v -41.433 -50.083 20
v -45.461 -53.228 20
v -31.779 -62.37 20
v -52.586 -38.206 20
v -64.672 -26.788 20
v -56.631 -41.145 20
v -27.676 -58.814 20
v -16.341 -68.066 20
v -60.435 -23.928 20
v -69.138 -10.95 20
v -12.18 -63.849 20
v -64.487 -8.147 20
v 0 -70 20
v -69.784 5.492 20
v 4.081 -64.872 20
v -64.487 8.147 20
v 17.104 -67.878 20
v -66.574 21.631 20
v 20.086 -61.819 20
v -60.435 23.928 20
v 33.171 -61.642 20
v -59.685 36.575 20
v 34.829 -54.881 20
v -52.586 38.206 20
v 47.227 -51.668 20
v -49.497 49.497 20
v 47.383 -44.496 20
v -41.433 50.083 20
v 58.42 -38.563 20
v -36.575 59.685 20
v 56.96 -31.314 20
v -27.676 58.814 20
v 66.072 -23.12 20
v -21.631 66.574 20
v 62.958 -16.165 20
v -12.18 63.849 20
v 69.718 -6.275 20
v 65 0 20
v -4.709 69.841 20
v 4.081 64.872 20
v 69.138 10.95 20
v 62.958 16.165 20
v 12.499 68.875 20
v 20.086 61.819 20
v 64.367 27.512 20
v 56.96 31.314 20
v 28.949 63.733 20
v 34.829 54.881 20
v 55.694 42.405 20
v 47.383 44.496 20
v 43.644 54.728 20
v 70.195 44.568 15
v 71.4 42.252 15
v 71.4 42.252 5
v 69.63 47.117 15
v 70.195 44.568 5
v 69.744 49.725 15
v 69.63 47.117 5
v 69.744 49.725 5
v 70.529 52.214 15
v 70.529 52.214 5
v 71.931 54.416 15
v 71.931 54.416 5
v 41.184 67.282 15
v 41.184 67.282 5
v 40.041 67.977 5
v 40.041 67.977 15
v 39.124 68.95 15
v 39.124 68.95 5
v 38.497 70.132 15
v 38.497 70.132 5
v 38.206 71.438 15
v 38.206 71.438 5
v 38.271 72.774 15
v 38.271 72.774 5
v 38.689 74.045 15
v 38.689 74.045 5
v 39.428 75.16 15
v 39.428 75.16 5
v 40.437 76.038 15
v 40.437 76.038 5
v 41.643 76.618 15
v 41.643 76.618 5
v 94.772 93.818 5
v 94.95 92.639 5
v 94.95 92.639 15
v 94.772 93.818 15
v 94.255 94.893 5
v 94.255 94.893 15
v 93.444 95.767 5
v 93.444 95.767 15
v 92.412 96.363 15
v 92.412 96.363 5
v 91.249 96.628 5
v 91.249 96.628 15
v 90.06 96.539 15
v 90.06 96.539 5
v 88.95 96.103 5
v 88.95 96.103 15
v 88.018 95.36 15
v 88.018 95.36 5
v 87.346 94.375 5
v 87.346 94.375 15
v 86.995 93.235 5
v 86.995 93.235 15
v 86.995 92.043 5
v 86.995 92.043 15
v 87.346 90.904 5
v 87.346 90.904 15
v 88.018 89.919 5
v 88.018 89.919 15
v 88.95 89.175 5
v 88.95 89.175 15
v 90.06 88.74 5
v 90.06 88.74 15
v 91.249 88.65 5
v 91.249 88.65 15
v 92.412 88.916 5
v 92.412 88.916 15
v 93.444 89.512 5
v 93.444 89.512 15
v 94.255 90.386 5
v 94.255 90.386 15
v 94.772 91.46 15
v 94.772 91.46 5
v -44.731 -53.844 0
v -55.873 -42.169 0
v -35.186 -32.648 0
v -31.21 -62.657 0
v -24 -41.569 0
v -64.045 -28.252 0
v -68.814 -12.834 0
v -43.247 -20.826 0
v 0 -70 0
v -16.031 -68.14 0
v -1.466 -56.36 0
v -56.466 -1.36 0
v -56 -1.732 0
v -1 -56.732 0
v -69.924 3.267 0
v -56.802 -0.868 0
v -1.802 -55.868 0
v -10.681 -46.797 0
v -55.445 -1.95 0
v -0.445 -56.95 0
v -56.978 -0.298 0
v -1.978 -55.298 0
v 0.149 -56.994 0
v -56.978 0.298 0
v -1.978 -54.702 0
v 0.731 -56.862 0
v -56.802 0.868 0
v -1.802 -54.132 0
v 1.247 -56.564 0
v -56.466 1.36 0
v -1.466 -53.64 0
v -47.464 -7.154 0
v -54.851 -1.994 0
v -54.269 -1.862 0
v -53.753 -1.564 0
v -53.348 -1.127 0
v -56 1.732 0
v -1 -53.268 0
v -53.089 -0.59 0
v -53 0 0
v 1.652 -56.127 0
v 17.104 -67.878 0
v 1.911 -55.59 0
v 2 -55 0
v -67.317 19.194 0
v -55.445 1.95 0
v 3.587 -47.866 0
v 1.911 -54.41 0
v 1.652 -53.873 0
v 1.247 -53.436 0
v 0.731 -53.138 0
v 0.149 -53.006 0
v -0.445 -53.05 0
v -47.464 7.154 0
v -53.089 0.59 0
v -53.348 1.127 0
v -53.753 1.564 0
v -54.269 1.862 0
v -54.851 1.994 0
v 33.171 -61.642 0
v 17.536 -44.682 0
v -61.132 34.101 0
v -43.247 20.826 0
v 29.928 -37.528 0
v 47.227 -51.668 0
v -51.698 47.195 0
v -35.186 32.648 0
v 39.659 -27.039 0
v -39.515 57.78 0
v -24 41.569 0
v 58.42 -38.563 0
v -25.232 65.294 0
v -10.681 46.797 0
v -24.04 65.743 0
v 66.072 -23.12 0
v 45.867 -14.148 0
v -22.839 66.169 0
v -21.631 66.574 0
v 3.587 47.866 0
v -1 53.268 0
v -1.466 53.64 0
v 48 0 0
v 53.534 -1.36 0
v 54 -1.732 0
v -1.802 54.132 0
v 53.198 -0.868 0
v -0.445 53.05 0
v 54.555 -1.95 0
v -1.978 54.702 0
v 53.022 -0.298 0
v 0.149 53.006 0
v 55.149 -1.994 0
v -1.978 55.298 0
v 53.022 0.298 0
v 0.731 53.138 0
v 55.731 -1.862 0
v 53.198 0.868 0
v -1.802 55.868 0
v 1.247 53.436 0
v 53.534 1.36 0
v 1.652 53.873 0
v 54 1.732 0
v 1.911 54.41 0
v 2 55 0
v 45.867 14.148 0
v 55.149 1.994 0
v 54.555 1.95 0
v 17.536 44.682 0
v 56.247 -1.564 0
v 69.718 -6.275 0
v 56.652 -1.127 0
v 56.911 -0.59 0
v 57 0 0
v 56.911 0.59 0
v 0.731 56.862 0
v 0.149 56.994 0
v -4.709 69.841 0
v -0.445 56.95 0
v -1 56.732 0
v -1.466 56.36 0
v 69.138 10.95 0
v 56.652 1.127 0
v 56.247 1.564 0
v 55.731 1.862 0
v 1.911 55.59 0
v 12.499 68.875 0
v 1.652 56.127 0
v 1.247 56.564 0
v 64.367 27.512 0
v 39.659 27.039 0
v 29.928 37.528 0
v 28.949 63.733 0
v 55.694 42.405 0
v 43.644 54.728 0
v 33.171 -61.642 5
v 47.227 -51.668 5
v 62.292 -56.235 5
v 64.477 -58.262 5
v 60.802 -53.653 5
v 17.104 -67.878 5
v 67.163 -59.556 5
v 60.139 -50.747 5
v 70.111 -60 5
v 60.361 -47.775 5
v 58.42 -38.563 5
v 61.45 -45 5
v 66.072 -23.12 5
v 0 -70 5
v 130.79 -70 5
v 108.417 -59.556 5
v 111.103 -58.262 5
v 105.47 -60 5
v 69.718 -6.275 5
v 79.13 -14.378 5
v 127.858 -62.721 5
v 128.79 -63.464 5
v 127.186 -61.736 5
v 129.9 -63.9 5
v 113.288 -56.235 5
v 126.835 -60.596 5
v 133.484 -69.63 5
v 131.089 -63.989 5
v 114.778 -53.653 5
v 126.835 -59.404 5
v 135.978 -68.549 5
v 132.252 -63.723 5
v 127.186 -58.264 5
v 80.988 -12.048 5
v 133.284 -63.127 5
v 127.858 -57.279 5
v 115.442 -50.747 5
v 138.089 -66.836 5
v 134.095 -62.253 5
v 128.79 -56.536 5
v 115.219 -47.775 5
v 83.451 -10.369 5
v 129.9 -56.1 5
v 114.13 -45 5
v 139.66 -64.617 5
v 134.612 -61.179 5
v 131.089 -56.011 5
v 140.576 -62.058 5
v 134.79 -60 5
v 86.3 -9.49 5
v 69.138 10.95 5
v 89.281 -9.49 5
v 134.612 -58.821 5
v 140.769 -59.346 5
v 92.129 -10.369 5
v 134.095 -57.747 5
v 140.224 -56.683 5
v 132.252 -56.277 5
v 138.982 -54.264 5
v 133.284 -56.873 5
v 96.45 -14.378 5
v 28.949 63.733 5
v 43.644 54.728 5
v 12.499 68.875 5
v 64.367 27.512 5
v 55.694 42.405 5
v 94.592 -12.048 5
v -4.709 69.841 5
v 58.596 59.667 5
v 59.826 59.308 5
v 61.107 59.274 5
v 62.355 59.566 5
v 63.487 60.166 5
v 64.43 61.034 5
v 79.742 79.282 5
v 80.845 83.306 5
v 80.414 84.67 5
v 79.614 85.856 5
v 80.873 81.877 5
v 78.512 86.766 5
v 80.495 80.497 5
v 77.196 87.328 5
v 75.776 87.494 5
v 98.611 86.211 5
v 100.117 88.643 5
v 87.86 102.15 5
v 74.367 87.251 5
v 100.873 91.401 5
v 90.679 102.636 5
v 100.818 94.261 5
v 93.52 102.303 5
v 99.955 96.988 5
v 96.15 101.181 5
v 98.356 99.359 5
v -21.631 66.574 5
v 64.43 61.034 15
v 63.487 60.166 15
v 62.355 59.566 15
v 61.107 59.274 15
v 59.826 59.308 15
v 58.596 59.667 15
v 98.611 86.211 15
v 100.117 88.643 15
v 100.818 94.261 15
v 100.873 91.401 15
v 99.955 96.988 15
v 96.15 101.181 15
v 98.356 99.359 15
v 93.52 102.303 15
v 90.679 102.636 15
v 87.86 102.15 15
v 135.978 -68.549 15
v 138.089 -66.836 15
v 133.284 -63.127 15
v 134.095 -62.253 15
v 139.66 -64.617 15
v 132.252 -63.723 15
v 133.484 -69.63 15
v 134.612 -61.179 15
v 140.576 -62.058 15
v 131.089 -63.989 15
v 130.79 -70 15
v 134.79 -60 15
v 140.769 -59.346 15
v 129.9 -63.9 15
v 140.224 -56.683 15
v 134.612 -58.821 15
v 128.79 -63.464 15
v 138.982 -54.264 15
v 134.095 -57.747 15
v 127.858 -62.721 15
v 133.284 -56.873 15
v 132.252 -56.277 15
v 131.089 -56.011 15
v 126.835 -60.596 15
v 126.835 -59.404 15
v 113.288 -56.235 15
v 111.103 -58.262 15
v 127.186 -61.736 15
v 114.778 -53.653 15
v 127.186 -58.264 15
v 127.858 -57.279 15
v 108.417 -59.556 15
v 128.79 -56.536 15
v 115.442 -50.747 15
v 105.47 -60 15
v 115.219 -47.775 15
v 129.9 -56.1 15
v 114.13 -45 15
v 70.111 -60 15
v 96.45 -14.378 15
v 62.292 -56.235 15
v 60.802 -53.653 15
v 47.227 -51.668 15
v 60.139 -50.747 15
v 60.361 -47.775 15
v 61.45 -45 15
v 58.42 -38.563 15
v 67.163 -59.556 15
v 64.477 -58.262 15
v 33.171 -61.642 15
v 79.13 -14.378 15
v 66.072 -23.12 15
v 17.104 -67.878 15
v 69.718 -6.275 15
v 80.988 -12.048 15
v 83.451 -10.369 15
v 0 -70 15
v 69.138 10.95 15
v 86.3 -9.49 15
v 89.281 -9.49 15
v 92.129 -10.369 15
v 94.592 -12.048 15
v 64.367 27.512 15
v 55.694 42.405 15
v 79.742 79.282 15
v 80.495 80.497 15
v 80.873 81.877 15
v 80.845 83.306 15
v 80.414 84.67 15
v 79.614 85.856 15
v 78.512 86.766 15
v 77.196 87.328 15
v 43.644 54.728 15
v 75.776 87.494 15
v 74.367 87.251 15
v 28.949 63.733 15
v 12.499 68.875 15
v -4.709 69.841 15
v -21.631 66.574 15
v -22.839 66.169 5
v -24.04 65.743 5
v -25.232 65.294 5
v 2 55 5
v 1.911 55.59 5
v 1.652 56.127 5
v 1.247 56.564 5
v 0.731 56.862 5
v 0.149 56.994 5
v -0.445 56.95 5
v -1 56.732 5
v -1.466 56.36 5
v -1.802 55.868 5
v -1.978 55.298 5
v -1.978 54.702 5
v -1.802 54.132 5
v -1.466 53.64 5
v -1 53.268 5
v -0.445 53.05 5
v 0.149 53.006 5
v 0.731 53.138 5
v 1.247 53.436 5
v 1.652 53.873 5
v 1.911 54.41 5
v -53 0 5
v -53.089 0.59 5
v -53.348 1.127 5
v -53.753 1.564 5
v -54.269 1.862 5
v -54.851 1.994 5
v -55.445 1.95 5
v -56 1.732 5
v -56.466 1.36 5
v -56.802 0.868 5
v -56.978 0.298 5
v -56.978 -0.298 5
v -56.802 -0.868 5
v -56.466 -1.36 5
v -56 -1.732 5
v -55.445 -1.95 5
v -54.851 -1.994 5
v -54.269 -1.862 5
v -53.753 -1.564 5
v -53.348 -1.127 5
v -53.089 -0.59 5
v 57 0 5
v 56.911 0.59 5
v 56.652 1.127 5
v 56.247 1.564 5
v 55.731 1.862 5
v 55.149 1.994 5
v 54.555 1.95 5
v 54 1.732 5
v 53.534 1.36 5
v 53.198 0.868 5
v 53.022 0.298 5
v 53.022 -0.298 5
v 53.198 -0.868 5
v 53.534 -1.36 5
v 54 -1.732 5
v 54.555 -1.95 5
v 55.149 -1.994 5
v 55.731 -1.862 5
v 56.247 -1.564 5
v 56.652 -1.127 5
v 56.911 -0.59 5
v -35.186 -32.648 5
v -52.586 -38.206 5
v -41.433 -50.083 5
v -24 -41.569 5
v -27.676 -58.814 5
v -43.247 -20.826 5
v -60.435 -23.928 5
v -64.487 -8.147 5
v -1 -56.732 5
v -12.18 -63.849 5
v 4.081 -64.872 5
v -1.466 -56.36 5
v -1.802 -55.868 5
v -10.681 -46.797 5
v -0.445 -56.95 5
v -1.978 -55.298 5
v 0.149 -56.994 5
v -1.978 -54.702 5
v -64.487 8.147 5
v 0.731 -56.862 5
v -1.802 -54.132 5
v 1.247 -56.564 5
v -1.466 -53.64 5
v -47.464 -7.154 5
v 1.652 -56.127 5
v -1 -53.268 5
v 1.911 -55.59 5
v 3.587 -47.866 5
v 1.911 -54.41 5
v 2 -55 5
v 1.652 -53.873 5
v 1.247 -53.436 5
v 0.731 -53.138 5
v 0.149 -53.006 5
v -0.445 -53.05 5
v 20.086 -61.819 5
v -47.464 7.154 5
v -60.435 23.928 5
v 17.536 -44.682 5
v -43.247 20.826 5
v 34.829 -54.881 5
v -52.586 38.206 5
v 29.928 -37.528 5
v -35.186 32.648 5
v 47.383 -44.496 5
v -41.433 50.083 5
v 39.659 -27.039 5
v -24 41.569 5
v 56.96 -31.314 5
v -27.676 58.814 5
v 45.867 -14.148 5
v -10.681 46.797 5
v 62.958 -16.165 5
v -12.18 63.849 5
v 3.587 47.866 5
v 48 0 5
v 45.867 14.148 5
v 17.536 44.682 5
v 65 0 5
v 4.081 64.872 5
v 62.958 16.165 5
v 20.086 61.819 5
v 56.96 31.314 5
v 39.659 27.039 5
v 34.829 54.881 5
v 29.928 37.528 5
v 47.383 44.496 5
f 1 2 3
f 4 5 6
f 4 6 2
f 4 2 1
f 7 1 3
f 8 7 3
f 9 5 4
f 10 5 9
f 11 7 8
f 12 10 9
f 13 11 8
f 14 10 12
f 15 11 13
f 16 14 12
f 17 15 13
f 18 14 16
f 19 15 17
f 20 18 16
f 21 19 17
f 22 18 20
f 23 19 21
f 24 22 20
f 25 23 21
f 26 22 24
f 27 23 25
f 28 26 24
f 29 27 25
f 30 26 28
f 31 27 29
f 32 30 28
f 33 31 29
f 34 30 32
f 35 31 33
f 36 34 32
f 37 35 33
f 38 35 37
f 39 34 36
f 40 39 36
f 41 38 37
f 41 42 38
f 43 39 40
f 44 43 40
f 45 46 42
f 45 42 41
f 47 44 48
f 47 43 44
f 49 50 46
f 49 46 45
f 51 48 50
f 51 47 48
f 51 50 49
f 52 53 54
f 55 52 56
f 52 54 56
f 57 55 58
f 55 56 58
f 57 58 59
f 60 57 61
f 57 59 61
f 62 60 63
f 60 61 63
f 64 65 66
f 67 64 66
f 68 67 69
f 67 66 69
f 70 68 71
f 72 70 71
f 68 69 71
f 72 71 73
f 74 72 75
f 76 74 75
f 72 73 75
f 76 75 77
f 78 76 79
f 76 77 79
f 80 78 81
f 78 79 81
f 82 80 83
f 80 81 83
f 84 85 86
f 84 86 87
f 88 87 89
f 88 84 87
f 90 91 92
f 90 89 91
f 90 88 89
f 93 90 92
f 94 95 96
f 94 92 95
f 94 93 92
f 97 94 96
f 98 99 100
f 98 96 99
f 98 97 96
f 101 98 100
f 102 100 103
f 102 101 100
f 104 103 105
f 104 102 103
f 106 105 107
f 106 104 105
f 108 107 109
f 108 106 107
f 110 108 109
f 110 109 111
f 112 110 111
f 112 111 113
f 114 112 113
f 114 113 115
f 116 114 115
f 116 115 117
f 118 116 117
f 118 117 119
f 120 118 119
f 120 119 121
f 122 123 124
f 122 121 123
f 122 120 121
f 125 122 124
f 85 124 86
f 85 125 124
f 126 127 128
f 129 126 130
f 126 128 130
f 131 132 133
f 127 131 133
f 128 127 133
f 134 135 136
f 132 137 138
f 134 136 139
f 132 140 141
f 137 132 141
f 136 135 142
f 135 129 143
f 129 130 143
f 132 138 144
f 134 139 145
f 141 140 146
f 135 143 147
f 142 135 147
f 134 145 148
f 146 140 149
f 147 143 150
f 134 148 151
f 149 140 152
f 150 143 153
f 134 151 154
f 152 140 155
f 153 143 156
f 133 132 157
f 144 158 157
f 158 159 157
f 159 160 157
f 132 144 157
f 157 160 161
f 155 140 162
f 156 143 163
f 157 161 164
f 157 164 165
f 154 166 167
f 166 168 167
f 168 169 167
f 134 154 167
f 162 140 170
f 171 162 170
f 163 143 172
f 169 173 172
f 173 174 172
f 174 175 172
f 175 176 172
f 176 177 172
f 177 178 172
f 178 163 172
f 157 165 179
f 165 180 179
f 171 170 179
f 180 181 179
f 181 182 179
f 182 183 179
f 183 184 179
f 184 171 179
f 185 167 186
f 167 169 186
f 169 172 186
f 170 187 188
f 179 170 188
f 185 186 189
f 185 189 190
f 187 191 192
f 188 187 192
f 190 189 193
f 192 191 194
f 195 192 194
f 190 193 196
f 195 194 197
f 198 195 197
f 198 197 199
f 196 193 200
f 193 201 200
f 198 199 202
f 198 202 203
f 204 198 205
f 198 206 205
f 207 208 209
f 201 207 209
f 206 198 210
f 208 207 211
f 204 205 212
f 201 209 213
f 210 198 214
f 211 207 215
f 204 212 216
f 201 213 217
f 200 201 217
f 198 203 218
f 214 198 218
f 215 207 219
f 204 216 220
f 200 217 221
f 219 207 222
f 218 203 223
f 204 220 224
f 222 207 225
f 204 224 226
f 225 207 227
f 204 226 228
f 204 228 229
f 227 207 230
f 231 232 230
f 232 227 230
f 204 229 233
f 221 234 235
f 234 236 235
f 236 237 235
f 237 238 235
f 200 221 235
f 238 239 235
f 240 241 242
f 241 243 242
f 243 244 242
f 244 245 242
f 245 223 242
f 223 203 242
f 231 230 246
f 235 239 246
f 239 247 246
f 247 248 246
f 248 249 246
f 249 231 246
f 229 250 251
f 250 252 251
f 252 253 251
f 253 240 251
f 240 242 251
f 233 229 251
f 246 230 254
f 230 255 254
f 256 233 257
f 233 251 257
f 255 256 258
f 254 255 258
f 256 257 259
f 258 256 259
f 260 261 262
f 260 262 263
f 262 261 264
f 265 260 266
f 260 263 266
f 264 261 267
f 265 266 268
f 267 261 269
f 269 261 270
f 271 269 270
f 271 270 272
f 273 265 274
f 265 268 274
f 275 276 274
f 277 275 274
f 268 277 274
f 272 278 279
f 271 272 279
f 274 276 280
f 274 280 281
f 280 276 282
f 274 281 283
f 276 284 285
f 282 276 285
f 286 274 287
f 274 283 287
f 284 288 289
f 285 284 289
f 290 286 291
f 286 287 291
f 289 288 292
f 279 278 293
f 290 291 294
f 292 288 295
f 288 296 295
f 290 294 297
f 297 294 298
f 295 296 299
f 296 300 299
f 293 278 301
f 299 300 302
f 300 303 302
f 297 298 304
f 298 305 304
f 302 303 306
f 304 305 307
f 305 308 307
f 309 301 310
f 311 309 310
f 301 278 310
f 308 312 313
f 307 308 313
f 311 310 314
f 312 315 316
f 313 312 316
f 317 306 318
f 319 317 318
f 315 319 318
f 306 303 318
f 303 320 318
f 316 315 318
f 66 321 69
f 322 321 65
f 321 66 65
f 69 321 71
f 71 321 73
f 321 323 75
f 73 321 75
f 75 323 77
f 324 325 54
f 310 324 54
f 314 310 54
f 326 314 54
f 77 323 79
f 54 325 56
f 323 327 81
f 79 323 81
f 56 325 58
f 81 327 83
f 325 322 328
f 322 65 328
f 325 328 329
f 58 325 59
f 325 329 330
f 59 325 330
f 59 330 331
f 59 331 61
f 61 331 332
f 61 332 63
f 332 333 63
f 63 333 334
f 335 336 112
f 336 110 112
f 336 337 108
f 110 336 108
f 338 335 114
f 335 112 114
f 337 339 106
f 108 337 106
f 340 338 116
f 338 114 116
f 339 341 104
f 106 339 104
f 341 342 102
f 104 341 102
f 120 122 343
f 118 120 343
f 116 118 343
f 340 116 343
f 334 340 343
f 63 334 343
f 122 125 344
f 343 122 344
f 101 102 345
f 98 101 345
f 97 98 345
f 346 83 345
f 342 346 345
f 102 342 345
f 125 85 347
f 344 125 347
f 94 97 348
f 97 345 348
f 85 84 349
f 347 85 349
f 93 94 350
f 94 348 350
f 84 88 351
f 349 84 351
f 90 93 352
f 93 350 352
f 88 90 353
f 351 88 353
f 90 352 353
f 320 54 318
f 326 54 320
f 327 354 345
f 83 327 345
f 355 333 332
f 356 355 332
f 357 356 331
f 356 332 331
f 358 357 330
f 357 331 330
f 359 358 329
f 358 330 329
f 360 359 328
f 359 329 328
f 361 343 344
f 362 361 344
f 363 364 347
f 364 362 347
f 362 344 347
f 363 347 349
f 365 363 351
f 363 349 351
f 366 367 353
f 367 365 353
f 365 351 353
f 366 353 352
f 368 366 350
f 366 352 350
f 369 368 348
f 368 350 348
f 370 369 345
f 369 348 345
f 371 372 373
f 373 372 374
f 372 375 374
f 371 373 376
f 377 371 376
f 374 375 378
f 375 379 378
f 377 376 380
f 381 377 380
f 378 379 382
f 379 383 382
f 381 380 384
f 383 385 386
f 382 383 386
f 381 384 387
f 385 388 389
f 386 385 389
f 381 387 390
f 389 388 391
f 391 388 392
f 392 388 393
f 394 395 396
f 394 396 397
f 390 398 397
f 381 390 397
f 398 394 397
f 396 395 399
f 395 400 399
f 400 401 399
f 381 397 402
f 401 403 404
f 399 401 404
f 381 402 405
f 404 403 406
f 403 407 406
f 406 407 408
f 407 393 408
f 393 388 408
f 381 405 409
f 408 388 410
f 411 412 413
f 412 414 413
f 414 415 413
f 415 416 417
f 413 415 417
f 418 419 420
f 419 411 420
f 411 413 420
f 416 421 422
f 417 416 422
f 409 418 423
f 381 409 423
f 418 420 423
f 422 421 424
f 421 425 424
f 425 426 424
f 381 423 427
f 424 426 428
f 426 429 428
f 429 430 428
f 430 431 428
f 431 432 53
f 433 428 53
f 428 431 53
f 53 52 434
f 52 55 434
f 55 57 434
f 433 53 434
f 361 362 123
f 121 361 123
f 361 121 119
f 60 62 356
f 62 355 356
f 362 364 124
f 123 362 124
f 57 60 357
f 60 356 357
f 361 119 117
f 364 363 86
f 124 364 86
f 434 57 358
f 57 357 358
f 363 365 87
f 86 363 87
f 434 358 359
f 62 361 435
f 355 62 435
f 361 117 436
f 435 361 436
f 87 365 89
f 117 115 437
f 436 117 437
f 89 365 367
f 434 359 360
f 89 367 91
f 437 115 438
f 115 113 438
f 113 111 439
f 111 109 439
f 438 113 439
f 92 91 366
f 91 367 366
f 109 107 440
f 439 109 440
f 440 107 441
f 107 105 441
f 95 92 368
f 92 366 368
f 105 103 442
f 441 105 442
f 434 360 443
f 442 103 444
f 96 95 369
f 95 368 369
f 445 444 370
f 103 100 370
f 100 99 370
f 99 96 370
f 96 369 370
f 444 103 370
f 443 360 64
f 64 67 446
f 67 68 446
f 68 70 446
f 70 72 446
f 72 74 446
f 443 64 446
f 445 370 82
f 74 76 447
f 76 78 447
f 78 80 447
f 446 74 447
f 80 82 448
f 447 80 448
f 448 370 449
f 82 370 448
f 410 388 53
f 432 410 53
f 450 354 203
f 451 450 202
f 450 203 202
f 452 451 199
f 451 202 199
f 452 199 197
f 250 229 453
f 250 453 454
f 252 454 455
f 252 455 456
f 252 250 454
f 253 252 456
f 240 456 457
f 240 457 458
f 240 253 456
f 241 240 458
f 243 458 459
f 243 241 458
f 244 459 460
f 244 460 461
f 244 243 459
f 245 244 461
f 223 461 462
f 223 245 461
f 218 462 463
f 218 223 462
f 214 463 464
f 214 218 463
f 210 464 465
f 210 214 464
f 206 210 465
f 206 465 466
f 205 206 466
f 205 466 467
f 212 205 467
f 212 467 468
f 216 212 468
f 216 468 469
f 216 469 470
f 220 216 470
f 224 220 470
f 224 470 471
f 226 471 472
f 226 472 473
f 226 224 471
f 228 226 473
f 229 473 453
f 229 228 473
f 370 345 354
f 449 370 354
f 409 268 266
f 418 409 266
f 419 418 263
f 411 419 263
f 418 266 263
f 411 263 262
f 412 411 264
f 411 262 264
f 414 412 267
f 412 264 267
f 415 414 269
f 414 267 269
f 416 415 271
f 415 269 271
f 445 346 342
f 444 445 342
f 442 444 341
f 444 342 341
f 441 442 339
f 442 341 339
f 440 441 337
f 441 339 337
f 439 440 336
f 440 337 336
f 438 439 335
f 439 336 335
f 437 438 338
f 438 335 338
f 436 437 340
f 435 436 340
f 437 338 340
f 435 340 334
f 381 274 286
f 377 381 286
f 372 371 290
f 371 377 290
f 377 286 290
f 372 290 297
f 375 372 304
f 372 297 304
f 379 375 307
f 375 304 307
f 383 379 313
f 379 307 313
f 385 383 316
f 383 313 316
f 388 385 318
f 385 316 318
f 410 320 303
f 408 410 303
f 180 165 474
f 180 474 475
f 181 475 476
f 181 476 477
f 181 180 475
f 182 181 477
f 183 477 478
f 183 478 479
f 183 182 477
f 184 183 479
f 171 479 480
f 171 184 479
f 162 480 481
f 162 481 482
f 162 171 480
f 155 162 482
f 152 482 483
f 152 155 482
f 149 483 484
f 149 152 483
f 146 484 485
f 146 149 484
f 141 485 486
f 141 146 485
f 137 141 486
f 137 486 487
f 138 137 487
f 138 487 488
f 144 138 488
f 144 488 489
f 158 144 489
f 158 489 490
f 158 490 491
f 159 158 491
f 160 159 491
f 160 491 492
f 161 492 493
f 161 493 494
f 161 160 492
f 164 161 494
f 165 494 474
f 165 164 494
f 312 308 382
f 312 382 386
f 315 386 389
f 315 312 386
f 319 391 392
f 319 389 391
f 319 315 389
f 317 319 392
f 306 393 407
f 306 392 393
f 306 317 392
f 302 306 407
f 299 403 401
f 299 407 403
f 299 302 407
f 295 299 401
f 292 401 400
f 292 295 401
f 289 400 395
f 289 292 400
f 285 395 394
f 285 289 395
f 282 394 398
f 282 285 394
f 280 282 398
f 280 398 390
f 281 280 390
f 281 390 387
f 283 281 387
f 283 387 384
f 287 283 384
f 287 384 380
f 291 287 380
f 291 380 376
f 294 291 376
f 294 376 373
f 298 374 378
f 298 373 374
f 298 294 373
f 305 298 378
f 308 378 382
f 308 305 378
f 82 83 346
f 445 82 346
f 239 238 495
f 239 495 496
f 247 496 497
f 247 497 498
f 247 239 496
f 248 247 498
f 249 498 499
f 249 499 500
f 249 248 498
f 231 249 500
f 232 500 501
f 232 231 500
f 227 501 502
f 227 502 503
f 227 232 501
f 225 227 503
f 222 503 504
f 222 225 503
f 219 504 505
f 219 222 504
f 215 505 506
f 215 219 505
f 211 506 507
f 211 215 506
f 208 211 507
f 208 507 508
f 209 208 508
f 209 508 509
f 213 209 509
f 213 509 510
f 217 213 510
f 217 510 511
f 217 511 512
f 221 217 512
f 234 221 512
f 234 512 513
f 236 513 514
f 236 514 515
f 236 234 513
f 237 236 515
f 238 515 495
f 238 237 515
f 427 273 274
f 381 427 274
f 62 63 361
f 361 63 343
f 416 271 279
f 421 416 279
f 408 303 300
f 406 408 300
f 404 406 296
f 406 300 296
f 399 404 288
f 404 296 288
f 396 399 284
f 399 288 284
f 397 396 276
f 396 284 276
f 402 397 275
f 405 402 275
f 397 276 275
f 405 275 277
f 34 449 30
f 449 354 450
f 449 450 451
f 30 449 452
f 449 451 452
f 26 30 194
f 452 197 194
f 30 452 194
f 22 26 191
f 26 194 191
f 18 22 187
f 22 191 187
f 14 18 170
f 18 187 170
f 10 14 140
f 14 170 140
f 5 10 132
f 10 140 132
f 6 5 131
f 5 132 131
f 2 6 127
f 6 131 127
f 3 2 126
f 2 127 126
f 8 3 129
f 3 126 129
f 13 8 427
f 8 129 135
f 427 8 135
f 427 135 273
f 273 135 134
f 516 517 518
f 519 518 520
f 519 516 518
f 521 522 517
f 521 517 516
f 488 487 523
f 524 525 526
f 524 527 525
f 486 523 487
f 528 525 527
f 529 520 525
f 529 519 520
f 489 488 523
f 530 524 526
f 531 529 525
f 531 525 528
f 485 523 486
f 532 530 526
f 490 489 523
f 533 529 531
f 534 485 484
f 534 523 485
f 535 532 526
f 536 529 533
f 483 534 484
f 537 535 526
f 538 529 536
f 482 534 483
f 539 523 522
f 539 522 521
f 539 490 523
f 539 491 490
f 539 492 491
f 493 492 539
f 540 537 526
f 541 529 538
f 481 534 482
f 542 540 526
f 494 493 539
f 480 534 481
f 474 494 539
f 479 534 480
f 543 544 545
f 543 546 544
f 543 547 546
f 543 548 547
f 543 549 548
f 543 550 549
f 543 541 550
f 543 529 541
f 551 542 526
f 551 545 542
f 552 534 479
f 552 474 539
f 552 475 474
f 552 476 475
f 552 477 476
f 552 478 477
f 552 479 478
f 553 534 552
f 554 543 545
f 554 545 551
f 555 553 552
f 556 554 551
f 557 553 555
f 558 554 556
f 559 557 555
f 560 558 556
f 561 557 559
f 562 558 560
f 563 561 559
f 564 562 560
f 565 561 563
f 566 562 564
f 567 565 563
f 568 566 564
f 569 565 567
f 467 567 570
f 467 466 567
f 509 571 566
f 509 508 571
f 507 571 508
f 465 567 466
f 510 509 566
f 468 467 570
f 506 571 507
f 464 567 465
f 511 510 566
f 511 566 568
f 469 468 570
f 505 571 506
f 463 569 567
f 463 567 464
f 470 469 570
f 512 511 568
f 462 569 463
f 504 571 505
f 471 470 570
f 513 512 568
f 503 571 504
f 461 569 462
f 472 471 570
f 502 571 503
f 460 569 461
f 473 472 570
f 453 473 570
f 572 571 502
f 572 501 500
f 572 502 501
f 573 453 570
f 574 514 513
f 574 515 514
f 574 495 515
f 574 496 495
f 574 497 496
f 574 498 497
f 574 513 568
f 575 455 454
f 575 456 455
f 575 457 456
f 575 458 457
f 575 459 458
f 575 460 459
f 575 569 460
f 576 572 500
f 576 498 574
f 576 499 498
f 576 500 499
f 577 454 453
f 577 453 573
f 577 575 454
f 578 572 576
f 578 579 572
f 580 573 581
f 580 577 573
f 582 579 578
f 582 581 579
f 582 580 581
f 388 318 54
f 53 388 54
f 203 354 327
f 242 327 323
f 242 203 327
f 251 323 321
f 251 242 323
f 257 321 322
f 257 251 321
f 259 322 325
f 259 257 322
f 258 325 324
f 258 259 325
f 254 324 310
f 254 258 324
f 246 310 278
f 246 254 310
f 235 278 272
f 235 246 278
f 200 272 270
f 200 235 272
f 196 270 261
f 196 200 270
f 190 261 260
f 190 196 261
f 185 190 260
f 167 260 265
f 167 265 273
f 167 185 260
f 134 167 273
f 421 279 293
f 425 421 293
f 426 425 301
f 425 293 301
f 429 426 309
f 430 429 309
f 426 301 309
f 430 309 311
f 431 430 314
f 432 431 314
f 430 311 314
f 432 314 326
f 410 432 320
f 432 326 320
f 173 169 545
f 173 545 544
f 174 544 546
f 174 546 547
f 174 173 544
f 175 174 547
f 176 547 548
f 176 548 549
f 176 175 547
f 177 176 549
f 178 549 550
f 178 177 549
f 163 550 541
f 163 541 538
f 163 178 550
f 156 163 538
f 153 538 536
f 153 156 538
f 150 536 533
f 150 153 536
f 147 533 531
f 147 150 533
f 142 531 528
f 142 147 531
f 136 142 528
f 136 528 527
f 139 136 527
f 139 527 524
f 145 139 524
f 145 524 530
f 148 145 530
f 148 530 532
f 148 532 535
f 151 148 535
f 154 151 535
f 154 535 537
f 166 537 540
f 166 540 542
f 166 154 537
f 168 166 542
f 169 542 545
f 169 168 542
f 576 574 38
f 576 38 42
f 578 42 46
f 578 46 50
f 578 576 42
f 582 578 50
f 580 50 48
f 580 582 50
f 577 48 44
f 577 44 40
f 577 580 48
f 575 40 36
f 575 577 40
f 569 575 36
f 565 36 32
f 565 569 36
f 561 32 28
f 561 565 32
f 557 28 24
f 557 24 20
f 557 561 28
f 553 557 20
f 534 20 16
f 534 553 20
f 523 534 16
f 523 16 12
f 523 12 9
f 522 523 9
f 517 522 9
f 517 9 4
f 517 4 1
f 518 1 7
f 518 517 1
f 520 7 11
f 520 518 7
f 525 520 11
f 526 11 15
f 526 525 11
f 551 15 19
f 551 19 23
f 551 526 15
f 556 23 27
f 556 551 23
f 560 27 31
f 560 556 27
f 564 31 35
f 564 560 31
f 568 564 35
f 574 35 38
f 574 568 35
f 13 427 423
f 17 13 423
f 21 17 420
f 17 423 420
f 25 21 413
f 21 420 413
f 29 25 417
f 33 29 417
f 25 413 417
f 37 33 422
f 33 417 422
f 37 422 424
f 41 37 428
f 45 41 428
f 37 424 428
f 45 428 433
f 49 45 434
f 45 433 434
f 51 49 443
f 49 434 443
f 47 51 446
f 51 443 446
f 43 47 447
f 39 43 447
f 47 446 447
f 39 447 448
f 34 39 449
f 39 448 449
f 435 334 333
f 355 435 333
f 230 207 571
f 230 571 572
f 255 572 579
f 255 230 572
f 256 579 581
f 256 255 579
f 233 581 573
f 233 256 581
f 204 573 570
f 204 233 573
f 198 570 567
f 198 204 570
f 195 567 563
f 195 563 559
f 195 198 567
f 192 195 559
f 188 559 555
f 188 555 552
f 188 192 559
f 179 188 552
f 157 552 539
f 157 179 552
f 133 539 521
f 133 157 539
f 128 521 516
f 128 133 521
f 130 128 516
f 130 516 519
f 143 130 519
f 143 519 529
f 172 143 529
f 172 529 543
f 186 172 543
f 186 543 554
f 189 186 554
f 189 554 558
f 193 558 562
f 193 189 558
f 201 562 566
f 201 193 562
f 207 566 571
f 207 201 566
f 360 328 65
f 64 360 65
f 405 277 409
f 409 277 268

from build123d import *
from build123d.topology import SkipClean

# Parameters (mm, degrees)
SKETCH_1_R          = 70
SKETCH_1_R_2        = 48
SKETCH_1_R_3        = 2
EXTRUDE_3_DEPTH     = 5
SKETCH_2_R          = 70
SKETCH_2_R_2        = 65
EXTRUDE_4_DEPTH     = 15
SKETCH_4_R          = 4
EXTRUDE_5_DEPTH     = 20
CUT_EXTRUDE_START   = -5
CUT_EXTRUDE_1_DEPTH = 5
CUT_EXTRUDE_2_DEPTH = 5


with BuildPart() as part:
    # 草图1 → 凸台-拉伸3 (new body)
    with BuildSketch(Plane.XY):
        Circle(SKETCH_1_R)
        Circle(SKETCH_1_R_2, mode=Mode.SUBTRACT)
        with Locations((55, 0)):
            Circle(SKETCH_1_R_3, mode=Mode.SUBTRACT)
        with Locations((0, -55)):
            Circle(SKETCH_1_R_3, mode=Mode.SUBTRACT)
        with Locations((-55, 0)):
            Circle(SKETCH_1_R_3, mode=Mode.SUBTRACT)
        with Locations((0, 55)):
            Circle(SKETCH_1_R_3, mode=Mode.SUBTRACT)
    extrude(amount=EXTRUDE_3_DEPTH)

    # 草图2 → 凸台-拉伸4 (add)
    with BuildSketch(Plane.XY.offset(5)):
        Circle(SKETCH_2_R)
        Circle(SKETCH_2_R_2, mode=Mode.SUBTRACT)
    extrude(amount=EXTRUDE_4_DEPTH)

    # 草图4 → 凸台-拉伸5 (add)
    with BuildSketch(Plane.XY):
        with BuildLine():
            ThreePointArc((70, 0), (49.497474683, -49.497474683), (0, -70))
            Line((0, -70), (130.79017873, -70))
            ThreePointArc((130.79017873, -70), (139.660287062, -64.617486132), (138.981699173, -54.264235636))
            Line((138.981699173, -54.264235636), (71.400059285, 42.252348663))
            ThreePointArc((71.400059285, 42.252348663), (69.601097512, 48.4243069), (71.931135296, 54.415989123))
            Line((71.931135296, 54.415989123), (98.610619895, 86.211360741))
            ThreePointArc((98.610619895, 86.211360741), (99.240551189, 98.231165873), (87.86000552, 102.149802001))
            Line((87.86000552, 102.149802001), (-21.631189606, 66.573956141))
            ThreePointArc((-21.631189606, 66.573956141), (41.14496766, 56.631189606), (70, 0))
        make_face()
        with BuildLine():
            Line((105.469670655, -60), (70.110686806, -60))
            ThreePointArc((70.110686806, -60), (61.450432768, -55), (61.450432768, -45))
            Line((61.450432768, -45), (79.129924692, -14.378221735))
            ThreePointArc((79.129924692, -14.378221735), (87.79017873, -9.378221735), (96.450432768, -14.378221735))
            Line((96.450432768, -14.378221735), (114.129924692, -45))
            ThreePointArc((114.129924692, -45), (114.129924692, -55), (105.469670655, -60))
        make_face(mode=Mode.SUBTRACT)
        with Locations((130.79017873, -60)):
            Circle(SKETCH_4_R, mode=Mode.SUBTRACT)
        with BuildLine():
            Line((41.642562118, 76.618222088), (74.366534304, 87.25088519))
            ThreePointArc((74.366534304, 87.25088519), (80.056807139, 85.291567126), (79.741841492, 79.28166456))
            Line((79.741841492, 79.28166456), (64.430038128, 61.033767892))
            ThreePointArc((64.430038128, 61.033767892), (61.740626192, 59.379590093), (58.596293763, 59.66666905))
            Line((58.596293763, 59.66666905), (41.18412494, 67.281902615))
            ThreePointArc((41.18412494, 67.281902615), (38.193663865, 72.108156862), (41.642562118, 76.618222088))
        make_face(mode=Mode.SUBTRACT)
        with Locations((90.950175463, 92.639236838)):
            Circle(SKETCH_4_R, mode=Mode.SUBTRACT)
    extrude(amount=EXTRUDE_5_DEPTH)

    # 草图5 → 切除-拉伸1 (cut)
    with BuildSketch(Plane.XY.offset(20).offset(CUT_EXTRUDE_START)):
        with BuildLine():
            Line((-21.631189606, 66.573956141), (116.729087569, 111.529935371))
            Line((116.729087569, 111.529935371), (175.711739026, -70))
            Line((175.711739026, -70), (0, -70))
            ThreePointArc((0, -70), (69.138183842, 10.950412553), (-21.631189606, 66.573956141))
        make_face()
    extrude(amount=CUT_EXTRUDE_1_DEPTH, mode=Mode.SUBTRACT)

    # 草图6 → 切除-拉伸2 (cut)
    with SkipClean():  # the faces are left unmerged after this step: merging them gives an invalid solid
        with BuildSketch(Plane(origin=(0, 0, 0), x_dir=(-1, 0, 0), z_dir=(0, 0, -1))):
            with BuildLine():
                Line((0, -70), (-171.744818914, -70))
                Line((-171.744818914, -70), (-152.584469484, 114.8340827))
                Line((-152.584469484, 114.8340827), (-131.3396111, 125.799170899))
                Line((-131.3396111, 125.799170899), (25.232046012, 65.294286535))
                ThreePointArc((25.232046012, 65.294286535), (-68.813516323, 12.833548663), (0, -70))
            make_face()
        extrude(amount=-CUT_EXTRUDE_2_DEPTH, mode=Mode.SUBTRACT)


solid = part.part
